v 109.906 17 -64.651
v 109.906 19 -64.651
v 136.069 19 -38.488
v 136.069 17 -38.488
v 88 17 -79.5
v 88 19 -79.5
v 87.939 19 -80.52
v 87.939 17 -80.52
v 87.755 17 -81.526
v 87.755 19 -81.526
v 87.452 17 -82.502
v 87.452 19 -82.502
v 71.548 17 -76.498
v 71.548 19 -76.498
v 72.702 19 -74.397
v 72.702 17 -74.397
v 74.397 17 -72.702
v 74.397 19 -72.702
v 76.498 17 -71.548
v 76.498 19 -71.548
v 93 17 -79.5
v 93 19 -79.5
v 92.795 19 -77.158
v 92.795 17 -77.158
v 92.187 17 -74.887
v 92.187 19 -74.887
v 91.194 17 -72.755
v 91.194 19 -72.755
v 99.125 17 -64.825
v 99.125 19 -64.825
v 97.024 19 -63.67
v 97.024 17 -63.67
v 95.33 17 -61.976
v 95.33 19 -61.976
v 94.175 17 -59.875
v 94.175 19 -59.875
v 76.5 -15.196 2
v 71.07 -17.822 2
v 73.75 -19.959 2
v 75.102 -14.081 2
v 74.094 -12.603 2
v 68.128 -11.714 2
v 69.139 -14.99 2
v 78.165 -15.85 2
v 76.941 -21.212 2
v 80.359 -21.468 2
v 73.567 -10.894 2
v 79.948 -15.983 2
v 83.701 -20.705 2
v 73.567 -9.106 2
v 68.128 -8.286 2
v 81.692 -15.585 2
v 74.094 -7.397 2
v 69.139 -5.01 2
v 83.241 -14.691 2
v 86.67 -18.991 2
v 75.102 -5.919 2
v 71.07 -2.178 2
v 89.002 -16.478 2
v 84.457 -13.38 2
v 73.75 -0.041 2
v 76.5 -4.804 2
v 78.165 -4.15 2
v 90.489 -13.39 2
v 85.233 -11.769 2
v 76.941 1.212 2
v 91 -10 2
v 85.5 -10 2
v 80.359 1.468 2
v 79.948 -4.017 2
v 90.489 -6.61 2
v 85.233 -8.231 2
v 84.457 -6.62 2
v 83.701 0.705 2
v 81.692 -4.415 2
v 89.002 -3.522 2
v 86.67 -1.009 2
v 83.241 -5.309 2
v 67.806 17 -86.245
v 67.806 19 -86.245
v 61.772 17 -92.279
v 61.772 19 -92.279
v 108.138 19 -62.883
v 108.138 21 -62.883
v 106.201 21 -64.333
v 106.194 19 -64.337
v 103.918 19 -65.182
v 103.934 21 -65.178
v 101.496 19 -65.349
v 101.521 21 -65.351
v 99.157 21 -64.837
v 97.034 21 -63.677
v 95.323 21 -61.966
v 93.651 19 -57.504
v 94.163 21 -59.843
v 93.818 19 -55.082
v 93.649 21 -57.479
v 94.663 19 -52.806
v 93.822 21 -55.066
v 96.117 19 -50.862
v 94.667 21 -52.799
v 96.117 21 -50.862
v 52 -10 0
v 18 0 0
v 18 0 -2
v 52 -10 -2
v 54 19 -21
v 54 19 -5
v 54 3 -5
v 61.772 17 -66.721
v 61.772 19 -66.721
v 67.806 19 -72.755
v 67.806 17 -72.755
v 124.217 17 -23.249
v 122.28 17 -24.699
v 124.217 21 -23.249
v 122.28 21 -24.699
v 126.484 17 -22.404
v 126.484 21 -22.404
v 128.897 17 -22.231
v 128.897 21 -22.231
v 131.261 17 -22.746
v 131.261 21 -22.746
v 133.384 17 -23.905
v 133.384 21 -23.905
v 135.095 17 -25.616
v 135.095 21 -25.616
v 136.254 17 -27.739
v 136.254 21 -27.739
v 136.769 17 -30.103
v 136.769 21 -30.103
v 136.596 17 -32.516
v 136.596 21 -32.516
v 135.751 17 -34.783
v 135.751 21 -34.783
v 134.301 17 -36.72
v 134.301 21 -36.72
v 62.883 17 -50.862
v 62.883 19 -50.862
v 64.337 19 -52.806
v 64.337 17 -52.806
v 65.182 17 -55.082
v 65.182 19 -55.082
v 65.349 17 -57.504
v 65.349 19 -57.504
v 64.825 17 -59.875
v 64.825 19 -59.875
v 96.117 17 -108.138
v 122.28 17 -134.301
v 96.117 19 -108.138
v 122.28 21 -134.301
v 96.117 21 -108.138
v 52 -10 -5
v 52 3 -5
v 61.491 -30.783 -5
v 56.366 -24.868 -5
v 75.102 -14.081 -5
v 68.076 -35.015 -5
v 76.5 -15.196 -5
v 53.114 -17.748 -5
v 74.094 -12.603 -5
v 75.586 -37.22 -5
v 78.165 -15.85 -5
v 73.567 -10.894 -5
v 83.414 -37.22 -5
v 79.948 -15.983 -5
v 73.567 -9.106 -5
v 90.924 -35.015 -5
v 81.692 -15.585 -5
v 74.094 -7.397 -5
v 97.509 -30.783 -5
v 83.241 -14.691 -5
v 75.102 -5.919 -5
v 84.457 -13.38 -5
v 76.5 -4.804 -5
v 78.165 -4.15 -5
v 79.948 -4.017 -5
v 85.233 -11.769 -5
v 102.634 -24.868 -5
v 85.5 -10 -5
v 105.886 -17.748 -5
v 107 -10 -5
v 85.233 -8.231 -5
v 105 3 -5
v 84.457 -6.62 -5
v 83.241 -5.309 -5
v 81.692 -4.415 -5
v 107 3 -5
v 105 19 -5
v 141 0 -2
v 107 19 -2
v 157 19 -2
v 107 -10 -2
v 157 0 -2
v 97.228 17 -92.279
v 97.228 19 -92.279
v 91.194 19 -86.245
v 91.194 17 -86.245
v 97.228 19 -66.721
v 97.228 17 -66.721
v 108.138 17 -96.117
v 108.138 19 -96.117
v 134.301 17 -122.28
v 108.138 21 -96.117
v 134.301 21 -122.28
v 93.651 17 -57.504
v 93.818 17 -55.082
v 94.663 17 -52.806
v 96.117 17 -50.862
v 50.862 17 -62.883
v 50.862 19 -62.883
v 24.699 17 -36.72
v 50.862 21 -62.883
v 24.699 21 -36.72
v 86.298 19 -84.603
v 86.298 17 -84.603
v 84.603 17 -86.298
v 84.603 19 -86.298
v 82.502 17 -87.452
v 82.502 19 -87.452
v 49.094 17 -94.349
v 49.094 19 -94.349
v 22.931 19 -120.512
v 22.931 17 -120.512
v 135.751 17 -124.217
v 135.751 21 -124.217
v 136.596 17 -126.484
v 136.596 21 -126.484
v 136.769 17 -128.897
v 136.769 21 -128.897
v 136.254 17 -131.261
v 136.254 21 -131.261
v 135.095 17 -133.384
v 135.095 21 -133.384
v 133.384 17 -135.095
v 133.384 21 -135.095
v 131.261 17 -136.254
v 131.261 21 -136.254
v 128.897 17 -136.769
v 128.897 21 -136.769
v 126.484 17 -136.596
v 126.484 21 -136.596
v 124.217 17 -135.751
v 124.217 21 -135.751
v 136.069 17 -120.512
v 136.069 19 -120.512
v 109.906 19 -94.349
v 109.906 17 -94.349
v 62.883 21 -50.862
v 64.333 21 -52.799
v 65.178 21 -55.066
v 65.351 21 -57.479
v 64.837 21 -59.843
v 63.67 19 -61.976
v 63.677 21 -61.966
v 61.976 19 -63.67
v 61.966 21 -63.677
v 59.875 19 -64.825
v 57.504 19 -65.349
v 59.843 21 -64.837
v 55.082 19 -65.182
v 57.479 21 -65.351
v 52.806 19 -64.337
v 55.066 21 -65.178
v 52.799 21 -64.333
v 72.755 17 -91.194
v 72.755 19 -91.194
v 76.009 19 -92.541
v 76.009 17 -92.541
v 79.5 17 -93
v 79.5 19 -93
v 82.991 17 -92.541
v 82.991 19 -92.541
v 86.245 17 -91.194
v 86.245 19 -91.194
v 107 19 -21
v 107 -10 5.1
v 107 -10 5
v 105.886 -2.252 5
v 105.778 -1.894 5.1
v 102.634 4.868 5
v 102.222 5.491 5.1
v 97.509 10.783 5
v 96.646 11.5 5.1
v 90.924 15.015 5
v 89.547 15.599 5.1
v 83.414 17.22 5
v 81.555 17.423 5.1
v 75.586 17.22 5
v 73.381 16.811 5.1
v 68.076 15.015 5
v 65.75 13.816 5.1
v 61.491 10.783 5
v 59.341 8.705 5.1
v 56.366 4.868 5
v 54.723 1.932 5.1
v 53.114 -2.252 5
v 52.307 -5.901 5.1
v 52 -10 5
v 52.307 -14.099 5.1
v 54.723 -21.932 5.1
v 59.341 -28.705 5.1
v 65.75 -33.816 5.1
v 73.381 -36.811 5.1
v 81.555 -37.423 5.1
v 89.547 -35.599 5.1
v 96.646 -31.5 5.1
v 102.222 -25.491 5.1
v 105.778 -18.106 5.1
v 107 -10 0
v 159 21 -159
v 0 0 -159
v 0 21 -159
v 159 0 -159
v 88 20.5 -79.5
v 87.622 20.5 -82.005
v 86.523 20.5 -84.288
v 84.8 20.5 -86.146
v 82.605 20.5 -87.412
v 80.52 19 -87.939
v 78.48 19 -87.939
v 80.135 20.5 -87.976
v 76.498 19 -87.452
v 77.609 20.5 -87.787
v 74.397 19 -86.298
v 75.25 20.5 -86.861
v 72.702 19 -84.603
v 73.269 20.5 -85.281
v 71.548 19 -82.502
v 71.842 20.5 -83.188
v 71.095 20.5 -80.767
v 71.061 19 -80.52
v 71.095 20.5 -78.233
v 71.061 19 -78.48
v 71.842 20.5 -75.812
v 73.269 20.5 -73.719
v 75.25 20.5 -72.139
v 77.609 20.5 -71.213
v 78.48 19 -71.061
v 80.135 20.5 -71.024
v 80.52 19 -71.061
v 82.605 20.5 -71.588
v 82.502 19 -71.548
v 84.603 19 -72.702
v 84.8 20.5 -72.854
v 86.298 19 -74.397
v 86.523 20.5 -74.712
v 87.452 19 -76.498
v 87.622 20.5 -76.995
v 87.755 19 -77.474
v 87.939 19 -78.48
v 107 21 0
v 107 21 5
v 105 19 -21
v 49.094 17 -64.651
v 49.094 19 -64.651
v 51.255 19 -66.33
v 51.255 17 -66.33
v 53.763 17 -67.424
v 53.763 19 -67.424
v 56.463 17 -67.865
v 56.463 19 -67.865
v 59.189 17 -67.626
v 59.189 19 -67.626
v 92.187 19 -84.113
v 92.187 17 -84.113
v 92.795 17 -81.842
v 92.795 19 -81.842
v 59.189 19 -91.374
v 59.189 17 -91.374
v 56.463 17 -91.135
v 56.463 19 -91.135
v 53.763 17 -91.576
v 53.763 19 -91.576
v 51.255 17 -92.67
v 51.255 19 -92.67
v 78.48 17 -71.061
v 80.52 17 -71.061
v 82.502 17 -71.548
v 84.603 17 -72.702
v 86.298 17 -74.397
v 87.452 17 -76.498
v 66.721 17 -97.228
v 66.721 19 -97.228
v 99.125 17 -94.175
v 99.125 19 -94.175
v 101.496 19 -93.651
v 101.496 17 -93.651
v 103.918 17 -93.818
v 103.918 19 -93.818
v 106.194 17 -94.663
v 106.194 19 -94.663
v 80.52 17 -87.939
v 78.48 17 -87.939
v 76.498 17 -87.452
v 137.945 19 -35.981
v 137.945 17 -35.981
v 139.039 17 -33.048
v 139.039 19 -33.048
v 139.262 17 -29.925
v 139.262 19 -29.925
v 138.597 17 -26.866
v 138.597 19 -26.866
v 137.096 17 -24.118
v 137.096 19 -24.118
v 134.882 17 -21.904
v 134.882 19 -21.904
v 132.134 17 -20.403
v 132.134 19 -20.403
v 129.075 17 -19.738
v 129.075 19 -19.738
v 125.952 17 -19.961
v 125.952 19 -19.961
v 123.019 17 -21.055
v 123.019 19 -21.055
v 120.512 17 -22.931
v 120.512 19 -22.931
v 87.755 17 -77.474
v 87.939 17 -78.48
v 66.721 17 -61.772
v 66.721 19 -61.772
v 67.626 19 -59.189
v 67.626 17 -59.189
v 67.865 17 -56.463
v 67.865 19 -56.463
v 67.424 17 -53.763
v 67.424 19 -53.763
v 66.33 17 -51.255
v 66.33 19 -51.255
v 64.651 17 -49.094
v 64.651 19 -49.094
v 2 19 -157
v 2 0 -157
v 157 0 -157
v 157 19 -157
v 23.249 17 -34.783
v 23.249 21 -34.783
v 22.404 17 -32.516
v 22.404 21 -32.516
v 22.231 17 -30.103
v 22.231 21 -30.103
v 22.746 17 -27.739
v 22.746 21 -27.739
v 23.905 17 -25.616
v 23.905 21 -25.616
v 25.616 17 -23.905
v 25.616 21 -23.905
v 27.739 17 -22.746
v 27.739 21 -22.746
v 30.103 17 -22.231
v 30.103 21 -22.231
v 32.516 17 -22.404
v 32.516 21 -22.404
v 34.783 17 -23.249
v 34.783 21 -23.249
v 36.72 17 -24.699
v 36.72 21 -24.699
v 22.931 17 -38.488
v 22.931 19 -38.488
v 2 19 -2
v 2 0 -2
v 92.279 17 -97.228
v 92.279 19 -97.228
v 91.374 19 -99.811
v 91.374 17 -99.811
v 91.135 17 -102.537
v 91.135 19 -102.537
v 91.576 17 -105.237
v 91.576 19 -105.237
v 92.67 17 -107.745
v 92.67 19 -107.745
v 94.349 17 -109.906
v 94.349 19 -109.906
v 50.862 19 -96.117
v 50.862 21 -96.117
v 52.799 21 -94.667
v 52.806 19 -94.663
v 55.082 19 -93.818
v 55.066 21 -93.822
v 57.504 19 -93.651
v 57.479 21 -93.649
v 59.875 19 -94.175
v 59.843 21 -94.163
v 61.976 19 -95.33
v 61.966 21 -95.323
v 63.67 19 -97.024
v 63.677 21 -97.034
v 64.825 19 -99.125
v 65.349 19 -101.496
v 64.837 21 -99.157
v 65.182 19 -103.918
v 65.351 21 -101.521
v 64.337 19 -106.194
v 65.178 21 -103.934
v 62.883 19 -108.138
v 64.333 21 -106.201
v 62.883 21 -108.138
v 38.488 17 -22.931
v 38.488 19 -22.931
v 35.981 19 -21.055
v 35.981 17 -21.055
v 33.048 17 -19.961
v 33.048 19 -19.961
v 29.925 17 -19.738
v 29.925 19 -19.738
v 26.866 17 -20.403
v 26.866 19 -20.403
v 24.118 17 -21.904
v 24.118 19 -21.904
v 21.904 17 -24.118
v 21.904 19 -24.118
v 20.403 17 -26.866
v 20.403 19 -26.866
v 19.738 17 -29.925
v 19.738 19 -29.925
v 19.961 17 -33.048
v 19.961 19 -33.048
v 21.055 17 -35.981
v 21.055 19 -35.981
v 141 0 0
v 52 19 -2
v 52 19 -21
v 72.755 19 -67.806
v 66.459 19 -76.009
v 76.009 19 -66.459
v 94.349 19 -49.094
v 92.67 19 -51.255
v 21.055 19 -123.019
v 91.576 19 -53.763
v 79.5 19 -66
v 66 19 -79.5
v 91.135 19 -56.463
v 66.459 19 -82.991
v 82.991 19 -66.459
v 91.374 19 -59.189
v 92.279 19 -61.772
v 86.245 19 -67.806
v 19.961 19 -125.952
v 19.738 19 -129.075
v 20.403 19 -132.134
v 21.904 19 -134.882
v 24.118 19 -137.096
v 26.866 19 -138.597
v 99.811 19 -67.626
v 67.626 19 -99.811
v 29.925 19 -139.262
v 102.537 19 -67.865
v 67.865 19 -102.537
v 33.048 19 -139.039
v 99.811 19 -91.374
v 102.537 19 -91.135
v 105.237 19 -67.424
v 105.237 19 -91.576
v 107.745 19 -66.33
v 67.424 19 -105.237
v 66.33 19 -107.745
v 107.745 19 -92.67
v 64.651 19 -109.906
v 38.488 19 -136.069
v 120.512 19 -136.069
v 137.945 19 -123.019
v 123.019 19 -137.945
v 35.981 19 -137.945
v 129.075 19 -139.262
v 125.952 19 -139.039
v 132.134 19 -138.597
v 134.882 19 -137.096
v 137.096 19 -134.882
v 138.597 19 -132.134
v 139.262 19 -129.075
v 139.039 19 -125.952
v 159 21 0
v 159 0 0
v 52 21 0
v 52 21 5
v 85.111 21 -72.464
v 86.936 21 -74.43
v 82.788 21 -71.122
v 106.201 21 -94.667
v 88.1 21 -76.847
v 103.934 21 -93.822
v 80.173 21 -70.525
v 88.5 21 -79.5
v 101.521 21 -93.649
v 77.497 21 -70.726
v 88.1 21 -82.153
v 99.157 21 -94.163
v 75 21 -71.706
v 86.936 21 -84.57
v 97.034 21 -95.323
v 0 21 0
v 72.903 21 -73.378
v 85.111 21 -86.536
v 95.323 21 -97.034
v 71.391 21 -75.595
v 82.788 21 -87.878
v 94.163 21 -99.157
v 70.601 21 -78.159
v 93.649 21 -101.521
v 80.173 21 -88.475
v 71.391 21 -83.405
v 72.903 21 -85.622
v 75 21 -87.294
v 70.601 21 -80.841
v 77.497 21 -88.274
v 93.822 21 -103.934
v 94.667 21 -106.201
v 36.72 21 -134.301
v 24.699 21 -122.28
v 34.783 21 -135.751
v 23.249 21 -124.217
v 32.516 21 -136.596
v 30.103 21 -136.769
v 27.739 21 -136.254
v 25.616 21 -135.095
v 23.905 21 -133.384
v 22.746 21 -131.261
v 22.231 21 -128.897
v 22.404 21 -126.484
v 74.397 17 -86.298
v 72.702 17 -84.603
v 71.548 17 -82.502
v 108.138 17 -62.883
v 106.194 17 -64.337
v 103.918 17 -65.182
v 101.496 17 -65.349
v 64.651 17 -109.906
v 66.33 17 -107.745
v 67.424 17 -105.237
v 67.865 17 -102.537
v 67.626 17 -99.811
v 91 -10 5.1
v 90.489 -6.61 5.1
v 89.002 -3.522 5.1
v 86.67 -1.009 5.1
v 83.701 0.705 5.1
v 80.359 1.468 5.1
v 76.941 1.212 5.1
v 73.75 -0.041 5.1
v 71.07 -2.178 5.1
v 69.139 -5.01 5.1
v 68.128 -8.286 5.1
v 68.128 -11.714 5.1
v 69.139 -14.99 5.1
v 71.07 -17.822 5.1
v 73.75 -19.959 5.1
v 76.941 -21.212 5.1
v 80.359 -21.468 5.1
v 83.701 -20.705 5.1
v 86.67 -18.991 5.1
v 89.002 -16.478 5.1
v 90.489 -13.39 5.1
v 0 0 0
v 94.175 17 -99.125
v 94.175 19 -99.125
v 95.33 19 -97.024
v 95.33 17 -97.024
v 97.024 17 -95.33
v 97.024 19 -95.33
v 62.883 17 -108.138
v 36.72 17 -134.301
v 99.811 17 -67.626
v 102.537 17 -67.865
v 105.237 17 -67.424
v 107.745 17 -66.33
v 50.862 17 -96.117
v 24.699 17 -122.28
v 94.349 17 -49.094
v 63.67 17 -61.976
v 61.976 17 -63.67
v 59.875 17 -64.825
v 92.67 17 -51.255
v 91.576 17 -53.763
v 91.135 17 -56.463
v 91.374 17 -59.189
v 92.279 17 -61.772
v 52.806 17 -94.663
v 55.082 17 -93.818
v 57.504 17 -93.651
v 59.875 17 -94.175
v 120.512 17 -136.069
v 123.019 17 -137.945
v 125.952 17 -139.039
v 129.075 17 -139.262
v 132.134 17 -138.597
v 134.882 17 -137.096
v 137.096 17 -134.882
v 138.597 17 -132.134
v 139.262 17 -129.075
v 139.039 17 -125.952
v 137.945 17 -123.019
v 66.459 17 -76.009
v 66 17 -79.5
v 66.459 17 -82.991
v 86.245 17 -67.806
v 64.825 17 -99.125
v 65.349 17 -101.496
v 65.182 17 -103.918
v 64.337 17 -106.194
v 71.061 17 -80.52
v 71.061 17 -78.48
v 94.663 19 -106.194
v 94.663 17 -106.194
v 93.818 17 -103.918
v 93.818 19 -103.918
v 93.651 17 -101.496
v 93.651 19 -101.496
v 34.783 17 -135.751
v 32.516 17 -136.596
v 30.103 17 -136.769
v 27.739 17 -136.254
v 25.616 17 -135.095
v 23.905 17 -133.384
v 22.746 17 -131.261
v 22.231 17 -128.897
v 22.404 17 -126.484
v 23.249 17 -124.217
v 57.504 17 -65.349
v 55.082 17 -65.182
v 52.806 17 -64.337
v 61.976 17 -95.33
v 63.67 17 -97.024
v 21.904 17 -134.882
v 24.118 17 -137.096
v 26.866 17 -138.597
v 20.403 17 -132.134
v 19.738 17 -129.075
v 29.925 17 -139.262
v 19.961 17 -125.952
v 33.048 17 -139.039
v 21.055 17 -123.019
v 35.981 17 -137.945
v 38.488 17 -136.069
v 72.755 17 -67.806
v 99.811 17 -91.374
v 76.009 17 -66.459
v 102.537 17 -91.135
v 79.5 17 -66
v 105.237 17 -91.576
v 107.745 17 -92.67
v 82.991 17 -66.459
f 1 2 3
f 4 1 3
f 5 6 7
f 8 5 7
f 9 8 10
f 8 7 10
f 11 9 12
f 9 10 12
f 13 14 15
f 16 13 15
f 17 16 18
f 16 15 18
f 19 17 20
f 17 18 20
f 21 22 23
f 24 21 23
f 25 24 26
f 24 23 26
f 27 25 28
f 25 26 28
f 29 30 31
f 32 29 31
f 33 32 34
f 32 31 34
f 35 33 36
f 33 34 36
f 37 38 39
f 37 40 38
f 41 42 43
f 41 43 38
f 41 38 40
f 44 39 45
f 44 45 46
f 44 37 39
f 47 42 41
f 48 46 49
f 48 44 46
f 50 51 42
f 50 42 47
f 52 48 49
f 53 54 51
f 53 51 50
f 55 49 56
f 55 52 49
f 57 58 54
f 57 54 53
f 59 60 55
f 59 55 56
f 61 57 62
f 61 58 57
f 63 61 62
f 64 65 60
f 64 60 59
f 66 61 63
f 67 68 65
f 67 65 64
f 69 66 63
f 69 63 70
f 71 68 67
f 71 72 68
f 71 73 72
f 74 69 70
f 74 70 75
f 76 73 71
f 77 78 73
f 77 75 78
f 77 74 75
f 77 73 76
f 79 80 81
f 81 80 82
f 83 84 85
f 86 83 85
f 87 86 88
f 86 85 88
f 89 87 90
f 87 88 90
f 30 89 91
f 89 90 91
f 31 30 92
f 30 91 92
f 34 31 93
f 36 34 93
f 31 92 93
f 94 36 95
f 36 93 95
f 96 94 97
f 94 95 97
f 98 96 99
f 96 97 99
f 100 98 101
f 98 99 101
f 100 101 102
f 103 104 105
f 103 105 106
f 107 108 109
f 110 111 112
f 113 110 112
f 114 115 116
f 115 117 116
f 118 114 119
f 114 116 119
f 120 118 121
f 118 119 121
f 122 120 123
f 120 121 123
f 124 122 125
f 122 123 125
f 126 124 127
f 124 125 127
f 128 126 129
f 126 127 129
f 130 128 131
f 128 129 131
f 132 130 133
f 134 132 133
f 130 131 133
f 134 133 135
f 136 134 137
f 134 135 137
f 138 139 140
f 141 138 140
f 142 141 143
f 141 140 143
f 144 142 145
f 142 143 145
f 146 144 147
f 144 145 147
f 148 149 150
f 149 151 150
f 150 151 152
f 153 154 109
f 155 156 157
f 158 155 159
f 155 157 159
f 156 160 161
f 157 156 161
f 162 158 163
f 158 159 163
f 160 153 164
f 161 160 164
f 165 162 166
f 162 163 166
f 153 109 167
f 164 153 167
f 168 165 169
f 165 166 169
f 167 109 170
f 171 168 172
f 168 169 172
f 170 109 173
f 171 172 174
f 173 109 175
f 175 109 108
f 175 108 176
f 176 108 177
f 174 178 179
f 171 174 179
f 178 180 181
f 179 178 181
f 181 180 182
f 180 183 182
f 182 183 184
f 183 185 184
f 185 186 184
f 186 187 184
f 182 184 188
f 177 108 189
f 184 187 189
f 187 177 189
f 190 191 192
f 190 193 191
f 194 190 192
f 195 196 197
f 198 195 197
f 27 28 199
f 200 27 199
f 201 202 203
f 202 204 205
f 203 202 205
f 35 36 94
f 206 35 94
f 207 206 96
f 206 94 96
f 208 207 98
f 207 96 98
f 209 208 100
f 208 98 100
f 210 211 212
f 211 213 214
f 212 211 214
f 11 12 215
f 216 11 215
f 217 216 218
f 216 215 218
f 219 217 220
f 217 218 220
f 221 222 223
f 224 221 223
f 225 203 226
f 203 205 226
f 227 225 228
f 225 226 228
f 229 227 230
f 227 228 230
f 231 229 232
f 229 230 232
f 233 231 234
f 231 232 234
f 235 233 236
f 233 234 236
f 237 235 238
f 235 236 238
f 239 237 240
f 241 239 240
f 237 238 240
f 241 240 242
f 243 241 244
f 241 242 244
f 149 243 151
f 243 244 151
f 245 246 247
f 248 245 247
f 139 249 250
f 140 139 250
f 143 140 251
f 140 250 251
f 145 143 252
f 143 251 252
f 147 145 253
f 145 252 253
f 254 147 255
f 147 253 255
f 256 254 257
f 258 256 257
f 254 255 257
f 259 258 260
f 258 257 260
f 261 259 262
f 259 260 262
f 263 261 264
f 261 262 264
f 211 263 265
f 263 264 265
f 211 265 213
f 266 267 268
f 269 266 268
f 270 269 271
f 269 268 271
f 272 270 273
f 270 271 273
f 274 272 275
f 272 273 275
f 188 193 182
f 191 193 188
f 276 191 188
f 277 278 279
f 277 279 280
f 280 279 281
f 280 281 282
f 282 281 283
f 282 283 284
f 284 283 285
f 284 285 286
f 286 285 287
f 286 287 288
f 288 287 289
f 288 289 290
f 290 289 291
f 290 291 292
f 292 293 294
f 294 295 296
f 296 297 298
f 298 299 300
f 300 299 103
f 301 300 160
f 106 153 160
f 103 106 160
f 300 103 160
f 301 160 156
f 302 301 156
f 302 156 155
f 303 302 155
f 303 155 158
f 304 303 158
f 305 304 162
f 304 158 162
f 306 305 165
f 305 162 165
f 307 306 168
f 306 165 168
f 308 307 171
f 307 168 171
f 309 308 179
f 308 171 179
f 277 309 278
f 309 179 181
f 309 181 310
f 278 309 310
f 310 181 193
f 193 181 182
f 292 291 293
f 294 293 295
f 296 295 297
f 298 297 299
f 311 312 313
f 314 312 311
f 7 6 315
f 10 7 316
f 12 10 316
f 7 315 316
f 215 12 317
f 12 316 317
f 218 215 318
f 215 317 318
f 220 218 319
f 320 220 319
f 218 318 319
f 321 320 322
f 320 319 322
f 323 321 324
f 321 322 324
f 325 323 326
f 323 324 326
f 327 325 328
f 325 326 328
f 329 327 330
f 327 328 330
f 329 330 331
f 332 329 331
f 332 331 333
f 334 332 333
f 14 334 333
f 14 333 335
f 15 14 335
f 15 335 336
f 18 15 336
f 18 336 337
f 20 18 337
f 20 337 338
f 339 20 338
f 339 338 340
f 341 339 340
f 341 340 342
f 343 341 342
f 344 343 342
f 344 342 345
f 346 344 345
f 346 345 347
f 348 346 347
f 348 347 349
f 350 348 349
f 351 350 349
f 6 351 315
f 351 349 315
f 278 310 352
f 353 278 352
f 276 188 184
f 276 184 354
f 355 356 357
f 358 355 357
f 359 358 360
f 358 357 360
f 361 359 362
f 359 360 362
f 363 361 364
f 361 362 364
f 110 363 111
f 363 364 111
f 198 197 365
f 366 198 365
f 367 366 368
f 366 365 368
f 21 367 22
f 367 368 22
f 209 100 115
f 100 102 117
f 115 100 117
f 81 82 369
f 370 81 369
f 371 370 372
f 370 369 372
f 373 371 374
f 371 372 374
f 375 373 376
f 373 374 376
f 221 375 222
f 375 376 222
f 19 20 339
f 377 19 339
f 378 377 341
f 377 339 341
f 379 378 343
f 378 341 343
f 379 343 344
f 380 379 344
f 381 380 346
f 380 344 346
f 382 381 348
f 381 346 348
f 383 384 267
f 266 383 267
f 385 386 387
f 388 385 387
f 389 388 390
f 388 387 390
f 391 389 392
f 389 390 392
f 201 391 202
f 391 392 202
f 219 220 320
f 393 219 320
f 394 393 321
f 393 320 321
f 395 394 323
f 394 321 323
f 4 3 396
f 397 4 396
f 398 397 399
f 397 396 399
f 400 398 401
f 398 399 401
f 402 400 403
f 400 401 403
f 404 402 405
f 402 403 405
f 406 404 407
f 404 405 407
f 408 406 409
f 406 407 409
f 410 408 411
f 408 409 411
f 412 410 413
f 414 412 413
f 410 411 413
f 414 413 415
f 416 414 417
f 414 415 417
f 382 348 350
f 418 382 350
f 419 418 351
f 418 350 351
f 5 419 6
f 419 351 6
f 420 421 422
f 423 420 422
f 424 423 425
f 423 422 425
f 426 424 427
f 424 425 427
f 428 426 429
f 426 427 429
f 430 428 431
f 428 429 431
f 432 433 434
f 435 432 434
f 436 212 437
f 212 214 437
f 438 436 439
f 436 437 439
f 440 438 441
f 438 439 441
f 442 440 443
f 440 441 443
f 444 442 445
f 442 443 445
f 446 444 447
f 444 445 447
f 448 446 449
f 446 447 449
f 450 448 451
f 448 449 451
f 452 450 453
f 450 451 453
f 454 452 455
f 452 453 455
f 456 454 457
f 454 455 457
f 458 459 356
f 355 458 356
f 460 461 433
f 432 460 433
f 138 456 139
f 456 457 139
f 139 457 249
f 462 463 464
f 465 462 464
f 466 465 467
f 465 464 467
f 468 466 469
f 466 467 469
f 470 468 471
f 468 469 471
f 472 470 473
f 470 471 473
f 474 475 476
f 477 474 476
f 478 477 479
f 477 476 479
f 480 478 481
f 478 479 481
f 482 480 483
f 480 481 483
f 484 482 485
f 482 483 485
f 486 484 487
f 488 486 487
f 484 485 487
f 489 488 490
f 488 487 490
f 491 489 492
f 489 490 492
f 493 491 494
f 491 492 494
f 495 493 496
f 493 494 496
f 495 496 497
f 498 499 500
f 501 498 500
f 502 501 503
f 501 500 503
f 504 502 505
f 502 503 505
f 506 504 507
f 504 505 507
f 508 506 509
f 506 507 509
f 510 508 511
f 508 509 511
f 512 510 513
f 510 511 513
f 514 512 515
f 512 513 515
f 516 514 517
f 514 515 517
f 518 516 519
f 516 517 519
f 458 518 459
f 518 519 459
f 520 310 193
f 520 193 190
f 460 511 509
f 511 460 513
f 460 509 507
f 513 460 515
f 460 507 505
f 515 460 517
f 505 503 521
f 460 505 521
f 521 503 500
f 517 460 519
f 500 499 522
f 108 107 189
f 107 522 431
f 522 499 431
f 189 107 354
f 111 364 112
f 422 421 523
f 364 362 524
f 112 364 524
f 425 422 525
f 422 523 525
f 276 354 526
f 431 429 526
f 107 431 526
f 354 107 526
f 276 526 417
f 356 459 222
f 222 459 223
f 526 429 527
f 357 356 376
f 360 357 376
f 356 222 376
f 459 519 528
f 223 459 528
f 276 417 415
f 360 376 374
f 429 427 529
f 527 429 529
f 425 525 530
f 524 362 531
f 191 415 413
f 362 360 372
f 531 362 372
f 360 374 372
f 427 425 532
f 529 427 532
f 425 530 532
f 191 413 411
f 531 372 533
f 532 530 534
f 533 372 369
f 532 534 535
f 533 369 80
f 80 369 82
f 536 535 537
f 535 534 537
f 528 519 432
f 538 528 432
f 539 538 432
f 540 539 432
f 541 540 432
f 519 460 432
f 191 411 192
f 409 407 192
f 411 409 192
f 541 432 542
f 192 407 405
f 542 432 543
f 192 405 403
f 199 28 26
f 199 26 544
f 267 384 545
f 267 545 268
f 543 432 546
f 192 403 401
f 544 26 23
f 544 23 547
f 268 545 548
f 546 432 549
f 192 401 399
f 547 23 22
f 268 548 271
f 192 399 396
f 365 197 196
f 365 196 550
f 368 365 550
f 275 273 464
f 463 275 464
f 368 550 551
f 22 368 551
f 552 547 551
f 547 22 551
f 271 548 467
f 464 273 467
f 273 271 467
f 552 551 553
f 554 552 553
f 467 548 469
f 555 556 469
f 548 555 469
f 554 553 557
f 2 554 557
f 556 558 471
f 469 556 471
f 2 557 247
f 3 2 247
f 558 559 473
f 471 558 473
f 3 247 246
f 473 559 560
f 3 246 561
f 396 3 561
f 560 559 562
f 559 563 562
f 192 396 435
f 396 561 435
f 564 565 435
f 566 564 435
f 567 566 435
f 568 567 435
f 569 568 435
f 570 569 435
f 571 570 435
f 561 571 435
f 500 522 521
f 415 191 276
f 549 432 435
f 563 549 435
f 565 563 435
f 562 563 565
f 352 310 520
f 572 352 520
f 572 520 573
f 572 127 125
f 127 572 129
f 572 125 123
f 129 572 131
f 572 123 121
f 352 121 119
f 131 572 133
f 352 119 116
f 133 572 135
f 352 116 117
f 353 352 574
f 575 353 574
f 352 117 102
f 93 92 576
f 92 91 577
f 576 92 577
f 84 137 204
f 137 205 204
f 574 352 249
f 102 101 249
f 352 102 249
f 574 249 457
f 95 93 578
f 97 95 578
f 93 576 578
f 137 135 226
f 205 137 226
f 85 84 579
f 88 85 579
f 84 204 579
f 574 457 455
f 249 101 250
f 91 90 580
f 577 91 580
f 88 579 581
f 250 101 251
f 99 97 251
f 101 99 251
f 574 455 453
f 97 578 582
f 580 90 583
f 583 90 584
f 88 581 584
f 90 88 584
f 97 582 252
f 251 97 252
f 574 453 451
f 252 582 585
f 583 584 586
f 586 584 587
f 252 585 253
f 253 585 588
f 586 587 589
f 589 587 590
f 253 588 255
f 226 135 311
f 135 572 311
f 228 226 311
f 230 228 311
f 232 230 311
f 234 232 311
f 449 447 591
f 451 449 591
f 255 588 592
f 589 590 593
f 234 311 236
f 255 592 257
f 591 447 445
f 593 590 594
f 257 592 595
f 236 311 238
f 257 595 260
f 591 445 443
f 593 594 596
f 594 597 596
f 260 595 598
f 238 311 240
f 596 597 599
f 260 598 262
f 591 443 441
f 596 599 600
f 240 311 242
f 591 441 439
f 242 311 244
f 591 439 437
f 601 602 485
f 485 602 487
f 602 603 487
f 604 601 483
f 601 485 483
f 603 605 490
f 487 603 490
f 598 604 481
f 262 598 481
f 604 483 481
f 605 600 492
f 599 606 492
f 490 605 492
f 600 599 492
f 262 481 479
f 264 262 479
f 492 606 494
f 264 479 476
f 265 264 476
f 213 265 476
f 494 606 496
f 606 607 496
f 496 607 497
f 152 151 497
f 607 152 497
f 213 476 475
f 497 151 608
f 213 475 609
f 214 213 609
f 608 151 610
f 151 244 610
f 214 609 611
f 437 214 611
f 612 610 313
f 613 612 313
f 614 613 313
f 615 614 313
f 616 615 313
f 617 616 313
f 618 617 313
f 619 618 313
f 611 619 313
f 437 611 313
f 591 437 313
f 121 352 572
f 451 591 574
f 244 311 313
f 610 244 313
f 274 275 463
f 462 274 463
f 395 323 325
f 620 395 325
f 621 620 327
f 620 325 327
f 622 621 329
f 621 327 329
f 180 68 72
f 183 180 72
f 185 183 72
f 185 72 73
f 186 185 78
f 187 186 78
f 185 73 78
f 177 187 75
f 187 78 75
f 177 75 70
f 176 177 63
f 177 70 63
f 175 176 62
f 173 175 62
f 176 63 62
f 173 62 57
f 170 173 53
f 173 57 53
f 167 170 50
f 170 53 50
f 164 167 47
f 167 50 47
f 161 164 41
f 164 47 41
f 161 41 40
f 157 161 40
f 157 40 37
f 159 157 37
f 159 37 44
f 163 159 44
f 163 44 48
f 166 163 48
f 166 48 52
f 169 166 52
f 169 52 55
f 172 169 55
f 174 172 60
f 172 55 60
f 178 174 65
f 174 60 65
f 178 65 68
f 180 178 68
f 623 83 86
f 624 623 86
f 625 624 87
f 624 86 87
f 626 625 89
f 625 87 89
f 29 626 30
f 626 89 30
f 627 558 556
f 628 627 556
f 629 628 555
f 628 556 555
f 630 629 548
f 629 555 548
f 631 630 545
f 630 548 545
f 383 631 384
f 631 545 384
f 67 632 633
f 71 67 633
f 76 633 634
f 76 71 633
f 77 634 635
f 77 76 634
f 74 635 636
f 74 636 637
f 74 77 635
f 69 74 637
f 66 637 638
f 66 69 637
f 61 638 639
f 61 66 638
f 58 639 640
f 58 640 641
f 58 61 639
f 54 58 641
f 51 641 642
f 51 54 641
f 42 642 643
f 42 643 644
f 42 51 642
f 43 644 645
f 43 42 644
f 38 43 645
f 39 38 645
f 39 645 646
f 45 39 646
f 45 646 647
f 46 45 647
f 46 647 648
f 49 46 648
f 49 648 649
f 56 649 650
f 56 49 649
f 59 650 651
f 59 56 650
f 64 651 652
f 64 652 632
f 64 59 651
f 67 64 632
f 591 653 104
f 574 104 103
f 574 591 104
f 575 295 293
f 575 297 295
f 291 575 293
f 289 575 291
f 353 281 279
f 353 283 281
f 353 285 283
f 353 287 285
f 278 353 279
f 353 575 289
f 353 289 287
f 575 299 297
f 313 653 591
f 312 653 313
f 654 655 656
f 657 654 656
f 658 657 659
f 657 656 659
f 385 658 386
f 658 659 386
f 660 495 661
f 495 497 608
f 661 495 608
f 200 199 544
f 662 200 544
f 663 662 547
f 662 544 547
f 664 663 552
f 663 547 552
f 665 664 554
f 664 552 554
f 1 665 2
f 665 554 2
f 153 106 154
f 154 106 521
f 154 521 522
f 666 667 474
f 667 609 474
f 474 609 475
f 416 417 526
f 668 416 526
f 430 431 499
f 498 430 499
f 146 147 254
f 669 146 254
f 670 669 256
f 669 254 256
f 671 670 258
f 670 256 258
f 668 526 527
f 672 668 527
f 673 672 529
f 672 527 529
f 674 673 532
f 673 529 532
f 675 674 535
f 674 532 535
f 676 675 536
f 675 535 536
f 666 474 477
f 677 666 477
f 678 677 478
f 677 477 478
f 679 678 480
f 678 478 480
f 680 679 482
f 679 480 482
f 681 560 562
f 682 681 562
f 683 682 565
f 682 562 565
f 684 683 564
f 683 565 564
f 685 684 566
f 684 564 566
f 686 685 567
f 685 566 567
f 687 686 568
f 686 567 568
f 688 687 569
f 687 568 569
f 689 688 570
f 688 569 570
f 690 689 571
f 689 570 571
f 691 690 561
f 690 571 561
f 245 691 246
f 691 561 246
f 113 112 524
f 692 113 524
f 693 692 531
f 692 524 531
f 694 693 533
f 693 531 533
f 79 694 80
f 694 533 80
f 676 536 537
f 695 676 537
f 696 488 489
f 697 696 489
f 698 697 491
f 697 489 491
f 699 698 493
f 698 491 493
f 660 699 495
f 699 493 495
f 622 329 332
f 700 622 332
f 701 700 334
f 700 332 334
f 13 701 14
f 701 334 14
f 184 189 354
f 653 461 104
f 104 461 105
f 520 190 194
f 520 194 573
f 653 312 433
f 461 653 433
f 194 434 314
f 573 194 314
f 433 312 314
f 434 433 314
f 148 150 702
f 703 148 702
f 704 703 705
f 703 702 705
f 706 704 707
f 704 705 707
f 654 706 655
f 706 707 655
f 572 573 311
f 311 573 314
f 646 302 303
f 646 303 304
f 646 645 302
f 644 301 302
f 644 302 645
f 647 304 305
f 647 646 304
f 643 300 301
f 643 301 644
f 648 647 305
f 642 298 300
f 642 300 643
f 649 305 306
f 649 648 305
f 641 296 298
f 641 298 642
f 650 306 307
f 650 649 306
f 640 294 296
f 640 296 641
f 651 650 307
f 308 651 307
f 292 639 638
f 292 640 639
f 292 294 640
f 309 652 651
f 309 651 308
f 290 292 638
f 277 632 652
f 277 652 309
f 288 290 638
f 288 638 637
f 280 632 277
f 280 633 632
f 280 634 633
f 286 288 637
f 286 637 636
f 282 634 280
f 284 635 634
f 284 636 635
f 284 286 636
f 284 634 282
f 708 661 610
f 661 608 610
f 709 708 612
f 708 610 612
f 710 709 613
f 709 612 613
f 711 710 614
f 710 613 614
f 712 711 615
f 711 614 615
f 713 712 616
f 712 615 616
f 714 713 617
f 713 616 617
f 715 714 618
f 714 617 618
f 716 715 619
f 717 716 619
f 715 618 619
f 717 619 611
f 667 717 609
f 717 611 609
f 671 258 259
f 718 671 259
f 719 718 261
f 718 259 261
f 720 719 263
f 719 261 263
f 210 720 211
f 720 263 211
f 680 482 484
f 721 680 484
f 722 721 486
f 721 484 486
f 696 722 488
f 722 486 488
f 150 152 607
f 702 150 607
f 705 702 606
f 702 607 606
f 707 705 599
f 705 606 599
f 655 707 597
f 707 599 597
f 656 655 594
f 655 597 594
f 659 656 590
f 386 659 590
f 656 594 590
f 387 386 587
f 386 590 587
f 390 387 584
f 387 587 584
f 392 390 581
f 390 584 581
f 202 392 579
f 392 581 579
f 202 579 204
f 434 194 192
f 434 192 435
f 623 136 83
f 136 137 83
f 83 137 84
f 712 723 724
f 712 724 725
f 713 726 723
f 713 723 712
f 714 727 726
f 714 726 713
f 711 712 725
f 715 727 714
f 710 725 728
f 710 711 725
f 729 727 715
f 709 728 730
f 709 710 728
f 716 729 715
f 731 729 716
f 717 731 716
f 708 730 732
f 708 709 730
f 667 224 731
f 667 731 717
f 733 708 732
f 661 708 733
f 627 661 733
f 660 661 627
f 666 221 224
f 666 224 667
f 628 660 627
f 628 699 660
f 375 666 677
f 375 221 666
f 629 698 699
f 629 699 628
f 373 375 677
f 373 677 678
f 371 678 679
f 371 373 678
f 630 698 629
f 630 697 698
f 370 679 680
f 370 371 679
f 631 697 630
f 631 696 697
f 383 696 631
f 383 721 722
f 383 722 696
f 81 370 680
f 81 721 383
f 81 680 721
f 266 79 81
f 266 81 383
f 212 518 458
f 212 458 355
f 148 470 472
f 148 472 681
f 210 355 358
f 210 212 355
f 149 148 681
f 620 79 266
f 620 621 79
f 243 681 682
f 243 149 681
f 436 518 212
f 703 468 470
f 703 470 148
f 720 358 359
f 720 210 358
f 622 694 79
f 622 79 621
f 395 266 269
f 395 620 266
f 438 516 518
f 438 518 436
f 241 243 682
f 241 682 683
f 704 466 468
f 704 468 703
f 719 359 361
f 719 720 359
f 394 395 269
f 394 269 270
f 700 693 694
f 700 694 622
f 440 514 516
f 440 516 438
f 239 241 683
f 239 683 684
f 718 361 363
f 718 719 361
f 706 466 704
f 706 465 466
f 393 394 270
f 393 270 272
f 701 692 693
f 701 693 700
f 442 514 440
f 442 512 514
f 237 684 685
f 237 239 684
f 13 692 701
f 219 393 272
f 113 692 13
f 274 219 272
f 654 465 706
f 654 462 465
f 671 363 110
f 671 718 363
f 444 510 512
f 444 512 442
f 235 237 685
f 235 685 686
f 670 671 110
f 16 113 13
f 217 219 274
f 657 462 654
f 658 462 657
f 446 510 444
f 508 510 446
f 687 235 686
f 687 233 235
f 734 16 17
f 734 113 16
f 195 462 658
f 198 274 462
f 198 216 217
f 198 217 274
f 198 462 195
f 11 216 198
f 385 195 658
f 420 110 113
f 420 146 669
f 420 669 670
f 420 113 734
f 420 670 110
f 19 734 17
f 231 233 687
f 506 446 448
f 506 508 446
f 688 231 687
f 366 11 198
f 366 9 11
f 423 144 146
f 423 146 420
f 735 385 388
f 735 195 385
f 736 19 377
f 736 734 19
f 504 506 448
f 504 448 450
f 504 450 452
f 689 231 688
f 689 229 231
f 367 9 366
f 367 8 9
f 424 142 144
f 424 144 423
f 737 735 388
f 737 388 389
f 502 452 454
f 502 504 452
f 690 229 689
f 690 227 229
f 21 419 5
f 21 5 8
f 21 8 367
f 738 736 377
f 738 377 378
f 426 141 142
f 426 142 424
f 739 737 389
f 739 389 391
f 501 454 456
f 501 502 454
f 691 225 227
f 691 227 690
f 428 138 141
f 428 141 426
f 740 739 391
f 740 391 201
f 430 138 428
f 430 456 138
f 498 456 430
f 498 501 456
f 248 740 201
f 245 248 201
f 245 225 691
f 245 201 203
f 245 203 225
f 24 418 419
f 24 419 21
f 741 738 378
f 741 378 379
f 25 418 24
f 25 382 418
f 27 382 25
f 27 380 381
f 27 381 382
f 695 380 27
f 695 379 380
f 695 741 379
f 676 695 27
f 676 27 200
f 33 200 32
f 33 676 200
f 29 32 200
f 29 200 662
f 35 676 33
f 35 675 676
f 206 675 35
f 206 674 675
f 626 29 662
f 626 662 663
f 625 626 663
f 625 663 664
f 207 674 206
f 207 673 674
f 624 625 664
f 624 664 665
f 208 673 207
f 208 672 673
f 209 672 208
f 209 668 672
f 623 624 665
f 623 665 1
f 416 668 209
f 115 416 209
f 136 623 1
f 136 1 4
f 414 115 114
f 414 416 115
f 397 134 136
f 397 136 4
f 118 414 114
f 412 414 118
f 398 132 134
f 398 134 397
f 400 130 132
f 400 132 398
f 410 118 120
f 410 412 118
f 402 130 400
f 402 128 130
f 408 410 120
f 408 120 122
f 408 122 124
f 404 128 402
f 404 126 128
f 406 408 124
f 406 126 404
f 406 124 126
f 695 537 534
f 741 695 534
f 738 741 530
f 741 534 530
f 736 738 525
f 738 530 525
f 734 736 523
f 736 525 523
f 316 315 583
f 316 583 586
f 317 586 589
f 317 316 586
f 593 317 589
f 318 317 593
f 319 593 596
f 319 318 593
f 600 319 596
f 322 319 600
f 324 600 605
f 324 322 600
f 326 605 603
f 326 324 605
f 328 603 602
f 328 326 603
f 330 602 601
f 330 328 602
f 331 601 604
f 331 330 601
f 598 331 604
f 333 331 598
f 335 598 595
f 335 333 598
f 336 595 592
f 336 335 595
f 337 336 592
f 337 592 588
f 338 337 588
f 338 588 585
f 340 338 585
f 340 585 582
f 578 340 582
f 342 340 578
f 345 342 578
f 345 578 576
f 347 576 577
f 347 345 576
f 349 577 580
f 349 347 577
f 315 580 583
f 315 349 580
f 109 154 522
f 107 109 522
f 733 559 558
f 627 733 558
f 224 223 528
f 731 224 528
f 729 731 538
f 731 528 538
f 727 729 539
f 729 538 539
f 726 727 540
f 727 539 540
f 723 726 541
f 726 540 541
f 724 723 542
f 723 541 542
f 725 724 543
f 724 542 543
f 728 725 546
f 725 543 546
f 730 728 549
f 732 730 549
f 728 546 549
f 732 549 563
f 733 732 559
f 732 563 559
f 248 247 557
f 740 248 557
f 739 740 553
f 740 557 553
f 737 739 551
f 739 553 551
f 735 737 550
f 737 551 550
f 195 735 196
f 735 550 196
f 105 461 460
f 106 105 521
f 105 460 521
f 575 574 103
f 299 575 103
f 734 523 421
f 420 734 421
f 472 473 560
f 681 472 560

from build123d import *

# Parameters (mm, degrees)
SKETCH2_W                = 159
SKETCH2_H                = 159
BOSS_EXTRUDE1_DEPTH      = 21
SHELL1_T                 = -2
BOSS_EXTRUDE2_DEPTH      = 5
BOSS_EXTRUDE2_DEPTH_BACK = 5
BOSS_EXTRUDE3_DEPTH      = 2
SKETCH6_R                = 11.5
CUT_EXTRUDE1_DEPTH       = 3
SKETCH7_R                = 6
CUT_EXTRUDE2_DEPTH       = 7
SKETCH8_R                = 8.5
CUT_EXTRUDE3_DEPTH       = 59.5
BOSS_EXTRUDE4_DEPTH      = 2
BOSS_EXTRUDE5_START      = 27.5
BOSS_EXTRUDE5_DEPTH      = 2
BOSS_EXTRUDE6_START      = -27.5
BOSS_EXTRUDE6_DEPTH      = 2
CHAMFER3_SIZE            = 0.5
SKETCH14_R               = 27.5
SKETCH14_R_2             = 11.5
BOSS_EXTRUDE7_DEPTH      = 0.1


with BuildPart() as part:
    # Sketch2 → Boss-Extrude1 (new body)
    with BuildSketch(Plane(origin=(0, 0, 0), x_dir=(1, 0, 0), z_dir=(0, 1, 0))):
        with Locations((79.5, 79.5)):
            Rectangle(SKETCH2_W, SKETCH2_H)
    extrude(amount=BOSS_EXTRUDE1_DEPTH)

    # Shell1
    shell1_openings = [part.faces().sort_by_distance(p)[0] for p in [
        (79.5, 0, -79.5),
    ]]
    offset(amount=SHELL1_T, openings=shell1_openings, kind=Kind.INTERSECTION)

    # Sketch4 → Boss-Extrude2 (add, two sides)
    with BuildSketch(Plane.XY) as boss_extrude2_sk:
        with BuildLine():
            Line((107, 21), (52, 21))
            Line((52, 21), (52, -10))
            ThreePointArc((52, -10), (79.5, -37.5), (107, -10))
            Line((107, -10), (107, 21))
        make_face()
    extrude(amount=BOSS_EXTRUDE2_DEPTH)
    extrude(boss_extrude2_sk.sketch, amount=-BOSS_EXTRUDE2_DEPTH_BACK)

    # Sketch5 → Boss-Extrude3 (add)
    with BuildSketch(Plane.XY):
        Polygon((52, -10), (52, 0), (18, 0), align=None)
        Polygon((107, 0), (107, -10), (141, 0), align=None)
    extrude(amount=-BOSS_EXTRUDE3_DEPTH)

    # Sketch6 → Cut-Extrude1 (cut)
    with BuildSketch(Plane.XY.offset(5)):
        with Locations((79.5, -10)):
            Circle(SKETCH6_R)
    extrude(amount=-CUT_EXTRUDE1_DEPTH, mode=Mode.SUBTRACT)

    # Sketch7 → Cut-Extrude2 (cut)
    with BuildSketch(Plane.XY.offset(2)):
        with Locations((79.5, -10)):
            Circle(SKETCH7_R)
    extrude(amount=-CUT_EXTRUDE2_DEPTH, mode=Mode.SUBTRACT)

    # Sketch8 → Cut-Extrude3 (cut, through all)
    with BuildSketch(Plane(origin=(0, 21, 0), x_dir=(1, 0, 0), z_dir=(0, 1, 0))):
        with Locations((79.5, 79.5)):
            Circle(SKETCH8_R)
        with BuildLine():
            Line((24.699224458, 122.279960262), (50.862175362, 96.117009358))
            ThreePointArc((50.862175362, 96.117009358), (62.882990642, 96.117009358), (62.882990642, 108.137824638))
            Line((62.882990642, 108.137824638), (36.720039738, 134.300775542))
            ThreePointArc((36.720039738, 134.300775542), (24.699224458, 134.300775542), (24.699224458, 122.279960262))
        make_face()
        with BuildLine():
            Line((122.279960262, 134.300775542), (96.117009358, 108.137824638))
            ThreePointArc((96.117009358, 108.137824638), (96.117009358, 96.117009358), (108.137824638, 96.117009358))
            Line((108.137824638, 96.117009358), (134.300775542, 122.279960262))
            ThreePointArc((134.300775542, 122.279960262), (134.300775542, 134.300775542), (122.279960262, 134.300775542))
        make_face()
        with BuildLine():
            Line((134.300775542, 36.720039738), (108.137824638, 62.882990642))
            ThreePointArc((108.137824638, 62.882990642), (96.117009358, 62.882990642), (96.117009358, 50.862175362))
            Line((96.117009358, 50.862175362), (122.279960262, 24.699224458))
            ThreePointArc((122.279960262, 24.699224458), (134.300775542, 24.699224458), (134.300775542, 36.720039738))
        make_face()
        with BuildLine():
            Line((50.862175362, 62.882990642), (24.699224458, 36.720039738))
            ThreePointArc((24.699224458, 36.720039738), (24.699224458, 24.699224458), (36.720039738, 24.699224458))
            Line((36.720039738, 24.699224458), (62.882990642, 50.862175362))
            ThreePointArc((62.882990642, 50.862175362), (62.882990642, 62.882990642), (50.862175362, 62.882990642))
        make_face()
    extrude(amount=-CUT_EXTRUDE3_DEPTH, mode=Mode.SUBTRACT)

    # Sketch9 → Boss-Extrude4 (add)
    with BuildSketch(Plane.XZ.offset(-19)):
        with BuildLine():
            ThreePointArc((49.094408409, -64.650757595), (55.099393063, -67.728724003), (61.77164987, -66.721397338))
            Line((61.77164987, -66.721397338), (59.874934843, -64.824682311))
            ThreePointArc((59.874934843, -64.824682311), (55.082431735, -65.181936674), (50.862175362, -62.882990642))
            Line((50.862175362, -62.882990642), (24.699224458, -36.720039738))
            ThreePointArc((24.699224458, -36.720039738), (24.699224458, -24.699224458), (36.720039738, -24.699224458))
            Line((36.720039738, -24.699224458), (62.882990642, -50.862175362))
            ThreePointArc((62.882990642, -50.862175362), (65.181936674, -55.082431735), (64.824682311, -59.874934843))
            Line((64.824682311, -59.874934843), (66.721397338, -61.77164987))
            ThreePointArc((66.721397338, -61.77164987), (67.728724003, -55.099393063), (64.650757595, -49.094408409))
            Line((64.650757595, -49.094408409), (38.487806691, -22.931457505))
            ThreePointArc((38.487806691, -22.931457505), (22.931457505, -22.931457505), (22.931457505, -38.487806691))
            Line((22.931457505, -38.487806691), (49.094408409, -64.650757595))
        make_face()
        with BuildLine():
            Line((94.175317689, -99.125065157), (92.278602662, -97.22835013))
            ThreePointArc((92.278602662, -97.22835013), (91.271275997, -103.900606937), (94.349242405, -109.905591591))
            Line((94.349242405, -109.905591591), (120.512193309, -136.068542495))
            ThreePointArc((120.512193309, -136.068542495), (136.068542495, -136.068542495), (136.068542495, -120.512193309))
            Line((136.068542495, -120.512193309), (109.905591591, -94.349242405))
            ThreePointArc((109.905591591, -94.349242405), (103.900606937, -91.271275997), (97.22835013, -92.278602662))
            Line((97.22835013, -92.278602662), (99.125065157, -94.175317689))
            ThreePointArc((99.125065157, -94.175317689), (103.917568265, -93.818063326), (108.137824638, -96.117009358))
            Line((108.137824638, -96.117009358), (134.300775542, -122.279960262))
            ThreePointArc((134.300775542, -122.279960262), (134.300775542, -134.300775542), (122.279960262, -134.300775542))
            Line((122.279960262, -134.300775542), (96.117009358, -108.137824638))
            ThreePointArc((96.117009358, -108.137824638), (93.818063326, -103.917568265), (94.175317689, -99.125065157))
        make_face()
        with BuildLine():
            Line((59.874934843, -64.824682311), (61.77164987, -66.721397338))
            ThreePointArc((61.77164987, -66.721397338), (64.650757595, -64.650757595), (66.721397338, -61.77164987))
            Line((66.721397338, -61.77164987), (64.824682311, -59.874934843))
            ThreePointArc((64.824682311, -59.874934843), (62.882990642, -62.882990642), (59.874934843, -64.824682311))
        make_face()
        with BuildLine():
            ThreePointArc((97.22835013, -92.278602662), (94.349242405, -94.349242405), (92.278602662, -97.22835013))
            Line((92.278602662, -97.22835013), (94.175317689, -99.125065157))
            ThreePointArc((94.175317689, -99.125065157), (96.117009358, -96.117009358), (99.125065157, -94.175317689))
            Line((99.125065157, -94.175317689), (97.22835013, -92.278602662))
        make_face()
        with BuildLine():
            ThreePointArc((71.547900691, -82.502351841), (71, -79.5), (71.547900691, -76.497648159))
            Line((71.547900691, -76.497648159), (67.805581809, -72.755329277))
            ThreePointArc((67.805581809, -72.755329277), (66, -79.5), (67.805581809, -86.244670723))
            Line((67.805581809, -86.244670723), (71.547900691, -82.502351841))
        make_face()
        with BuildLine():
            Line((67.805581809, -72.755329277), (71.547900691, -76.497648159))
            ThreePointArc((71.547900691, -76.497648159), (73.48959236, -73.48959236), (76.497648159, -71.547900691))
            Line((76.497648159, -71.547900691), (72.755329277, -67.805581809))
            ThreePointArc((72.755329277, -67.805581809), (69.954058454, -69.954058454), (67.805581809, -72.755329277))
        make_face()
        with BuildLine():
            Line((72.755329277, -67.805581809), (76.497648159, -71.547900691))
            ThreePointArc((76.497648159, -71.547900691), (79.5, -71), (82.502351841, -71.547900691))
            Line((82.502351841, -71.547900691), (86.244670723, -67.805581809))
            ThreePointArc((86.244670723, -67.805581809), (79.5, -66), (72.755329277, -67.805581809))
        make_face()
        with BuildLine():
            ThreePointArc((82.502351841, -71.547900691), (85.51040764, -73.48959236), (87.452099309, -76.497648159))
            Line((87.452099309, -76.497648159), (91.194418191, -72.755329277))
            ThreePointArc((91.194418191, -72.755329277), (89.045941546, -69.954058454), (86.244670723, -67.805581809))
            Line((86.244670723, -67.805581809), (82.502351841, -71.547900691))
        make_face()
        with BuildLine():
            ThreePointArc((88, -79.5), (87.861903017, -81.025967869), (87.452099309, -82.502351841))
            Line((87.452099309, -82.502351841), (91.194418191, -86.244670723))
            ThreePointArc((91.194418191, -86.244670723), (92.540794561, -82.991085391), (93, -79.5))
            ThreePointArc((93, -79.5), (92.540794561, -76.008914609), (91.194418191, -72.755329277))
            Line((91.194418191, -72.755329277), (87.452099309, -76.497648159))
            ThreePointArc((87.452099309, -76.497648159), (87.861903017, -77.974032131), (88, -79.5))
        make_face()
        with BuildLine():
            ThreePointArc((87.452099309, -82.502351841), (85.51040764, -85.51040764), (82.502351841, -87.452099309))
            Line((82.502351841, -87.452099309), (86.244670723, -91.194418191))
            ThreePointArc((86.244670723, -91.194418191), (89.045941546, -89.045941546), (91.194418191, -86.244670723))
            Line((91.194418191, -86.244670723), (87.452099309, -82.502351841))
        make_face()
        with BuildLine():
            ThreePointArc((76.497648159, -87.452099309), (73.48959236, -85.51040764), (71.547900691, -82.502351841))
            Line((71.547900691, -82.502351841), (67.805581809, -86.244670723))
            ThreePointArc((67.805581809, -86.244670723), (69.954058454, -89.045941546), (72.755329277, -91.194418191))
            Line((72.755329277, -91.194418191), (76.497648159, -87.452099309))
        make_face()
        with BuildLine():
            ThreePointArc((82.502351841, -87.452099309), (79.5, -88), (76.497648159, -87.452099309))
            Line((76.497648159, -87.452099309), (72.755329277, -91.194418191))
            ThreePointArc((72.755329277, -91.194418191), (79.5, -93), (86.244670723, -91.194418191))
            Line((86.244670723, -91.194418191), (82.502351841, -87.452099309))
        make_face()
        with BuildLine():
            ThreePointArc((72.755329277, -91.194418191), (69.954058454, -89.045941546), (67.805581809, -86.244670723))
            Line((67.805581809, -86.244670723), (61.77164987, -92.278602662))
            ThreePointArc((61.77164987, -92.278602662), (64.650757595, -94.349242405), (66.721397338, -97.22835013))
            Line((66.721397338, -97.22835013), (72.755329277, -91.194418191))
        make_face()
        with BuildLine():
            ThreePointArc((91.194418191, -86.244670723), (89.045941546, -89.045941546), (86.244670723, -91.194418191))
            Line((86.244670723, -91.194418191), (92.278602662, -97.22835013))
            ThreePointArc((92.278602662, -97.22835013), (94.349242405, -94.349242405), (97.22835013, -92.278602662))
            Line((97.22835013, -92.278602662), (91.194418191, -86.244670723))
        make_face()
        with BuildLine():
            ThreePointArc((86.244670723, -67.805581809), (89.045941546, -69.954058454), (91.194418191, -72.755329277))
            Line((91.194418191, -72.755329277), (97.22835013, -66.721397338))
            ThreePointArc((97.22835013, -66.721397338), (94.349242405, -64.650757595), (92.278602662, -61.77164987))
            Line((92.278602662, -61.77164987), (86.244670723, -67.805581809))
        make_face()
        with BuildLine():
            Line((61.77164987, -66.721397338), (67.805581809, -72.755329277))
            ThreePointArc((67.805581809, -72.755329277), (69.954058454, -69.954058454), (72.755329277, -67.805581809))
            Line((72.755329277, -67.805581809), (66.721397338, -61.77164987))
            ThreePointArc((66.721397338, -61.77164987), (64.650757595, -64.650757595), (61.77164987, -66.721397338))
        make_face()
        with BuildLine():
            Line((99.125065157, -64.824682311), (97.22835013, -66.721397338))
            ThreePointArc((97.22835013, -66.721397338), (103.900606937, -67.728724003), (109.905591591, -64.650757595))
            Line((109.905591591, -64.650757595), (136.068542495, -38.487806691))
            ThreePointArc((136.068542495, -38.487806691), (136.068542495, -22.931457505), (120.512193309, -22.931457505))
            Line((120.512193309, -22.931457505), (94.349242405, -49.094408409))
            ThreePointArc((94.349242405, -49.094408409), (91.271275997, -55.099393063), (92.278602662, -61.77164987))
            Line((92.278602662, -61.77164987), (94.175317689, -59.874934843))
            ThreePointArc((94.175317689, -59.874934843), (93.818063326, -55.082431735), (96.117009358, -50.862175362))
            Line((96.117009358, -50.862175362), (122.279960262, -24.699224458))
            ThreePointArc((122.279960262, -24.699224458), (134.300775542, -24.699224458), (134.300775542, -36.720039738))
            Line((134.300775542, -36.720039738), (108.137824638, -62.882990642))
            ThreePointArc((108.137824638, -62.882990642), (103.917568265, -65.181936674), (99.125065157, -64.824682311))
        make_face()
        with BuildLine():
            Line((59.874934843, -94.175317689), (61.77164987, -92.278602662))
            ThreePointArc((61.77164987, -92.278602662), (55.099393063, -91.271275997), (49.094408409, -94.349242405))
            Line((49.094408409, -94.349242405), (22.931457505, -120.512193309))
            ThreePointArc((22.931457505, -120.512193309), (22.931457505, -136.068542495), (38.487806691, -136.068542495))
            Line((38.487806691, -136.068542495), (64.650757595, -109.905591591))
            ThreePointArc((64.650757595, -109.905591591), (67.728724003, -103.900606937), (66.721397338, -97.22835013))
            Line((66.721397338, -97.22835013), (64.824682311, -99.125065157))
            ThreePointArc((64.824682311, -99.125065157), (65.181936674, -103.917568265), (62.882990642, -108.137824638))
            Line((62.882990642, -108.137824638), (36.720039738, -134.300775542))
            ThreePointArc((36.720039738, -134.300775542), (24.699224458, -134.300775542), (24.699224458, -122.279960262))
            Line((24.699224458, -122.279960262), (50.862175362, -96.117009358))
            ThreePointArc((50.862175362, -96.117009358), (55.082431735, -93.818063326), (59.874934843, -94.175317689))
        make_face()
        with BuildLine():
            ThreePointArc((66.721397338, -97.22835013), (64.650757595, -94.349242405), (61.77164987, -92.278602662))
            Line((61.77164987, -92.278602662), (59.874934843, -94.175317689))
            ThreePointArc((59.874934843, -94.175317689), (62.882990642, -96.117009358), (64.824682311, -99.125065157))
            Line((64.824682311, -99.125065157), (66.721397338, -97.22835013))
        make_face()
        with BuildLine():
            ThreePointArc((92.278602662, -61.77164987), (94.349242405, -64.650757595), (97.22835013, -66.721397338))
            Line((97.22835013, -66.721397338), (99.125065157, -64.824682311))
            ThreePointArc((99.125065157, -64.824682311), (96.117009358, -62.882990642), (94.175317689, -59.874934843))
            Line((94.175317689, -59.874934843), (92.278602662, -61.77164987))
        make_face()
    extrude(amount=BOSS_EXTRUDE4_DEPTH)

    # Sketch13 → Boss-Extrude5 (add)
    with BuildSketch(Plane(origin=(79.5, 0, 0), x_dir=(0, 0, -1), z_dir=(1, 0, 0)).offset(BOSS_EXTRUDE5_START)):
        Polygon((5, 19), (5, 3), (21, 19), align=None)
    extrude(amount=-BOSS_EXTRUDE5_DEPTH)

    # Sketch13<2> → Boss-Extrude6 (add)
    with BuildSketch(Plane(origin=(79.5, 0, 0), x_dir=(0, 0, -1), z_dir=(1, 0, 0)).offset(BOSS_EXTRUDE6_START)):
        Polygon((5, 19), (5, 3), (21, 19), align=None)
    extrude(amount=BOSS_EXTRUDE6_DEPTH)

    # Chamfer3
    chamfer3_edges = [part.edges().sort_by_distance(p)[0] for p in [
        (71, 21, -79.5),
    ]]
    chamfer(chamfer3_edges, length=CHAMFER3_SIZE)

    # Sketch14 → Boss-Extrude7 (add)
    with BuildSketch(Plane.XY.offset(5)):
        with Locations((79.5, -10)):
            Circle(SKETCH14_R)
        with Locations((79.5, -10)):
            Circle(SKETCH14_R_2, mode=Mode.SUBTRACT)
    extrude(amount=BOSS_EXTRUDE7_DEPTH)


solid = part.part
